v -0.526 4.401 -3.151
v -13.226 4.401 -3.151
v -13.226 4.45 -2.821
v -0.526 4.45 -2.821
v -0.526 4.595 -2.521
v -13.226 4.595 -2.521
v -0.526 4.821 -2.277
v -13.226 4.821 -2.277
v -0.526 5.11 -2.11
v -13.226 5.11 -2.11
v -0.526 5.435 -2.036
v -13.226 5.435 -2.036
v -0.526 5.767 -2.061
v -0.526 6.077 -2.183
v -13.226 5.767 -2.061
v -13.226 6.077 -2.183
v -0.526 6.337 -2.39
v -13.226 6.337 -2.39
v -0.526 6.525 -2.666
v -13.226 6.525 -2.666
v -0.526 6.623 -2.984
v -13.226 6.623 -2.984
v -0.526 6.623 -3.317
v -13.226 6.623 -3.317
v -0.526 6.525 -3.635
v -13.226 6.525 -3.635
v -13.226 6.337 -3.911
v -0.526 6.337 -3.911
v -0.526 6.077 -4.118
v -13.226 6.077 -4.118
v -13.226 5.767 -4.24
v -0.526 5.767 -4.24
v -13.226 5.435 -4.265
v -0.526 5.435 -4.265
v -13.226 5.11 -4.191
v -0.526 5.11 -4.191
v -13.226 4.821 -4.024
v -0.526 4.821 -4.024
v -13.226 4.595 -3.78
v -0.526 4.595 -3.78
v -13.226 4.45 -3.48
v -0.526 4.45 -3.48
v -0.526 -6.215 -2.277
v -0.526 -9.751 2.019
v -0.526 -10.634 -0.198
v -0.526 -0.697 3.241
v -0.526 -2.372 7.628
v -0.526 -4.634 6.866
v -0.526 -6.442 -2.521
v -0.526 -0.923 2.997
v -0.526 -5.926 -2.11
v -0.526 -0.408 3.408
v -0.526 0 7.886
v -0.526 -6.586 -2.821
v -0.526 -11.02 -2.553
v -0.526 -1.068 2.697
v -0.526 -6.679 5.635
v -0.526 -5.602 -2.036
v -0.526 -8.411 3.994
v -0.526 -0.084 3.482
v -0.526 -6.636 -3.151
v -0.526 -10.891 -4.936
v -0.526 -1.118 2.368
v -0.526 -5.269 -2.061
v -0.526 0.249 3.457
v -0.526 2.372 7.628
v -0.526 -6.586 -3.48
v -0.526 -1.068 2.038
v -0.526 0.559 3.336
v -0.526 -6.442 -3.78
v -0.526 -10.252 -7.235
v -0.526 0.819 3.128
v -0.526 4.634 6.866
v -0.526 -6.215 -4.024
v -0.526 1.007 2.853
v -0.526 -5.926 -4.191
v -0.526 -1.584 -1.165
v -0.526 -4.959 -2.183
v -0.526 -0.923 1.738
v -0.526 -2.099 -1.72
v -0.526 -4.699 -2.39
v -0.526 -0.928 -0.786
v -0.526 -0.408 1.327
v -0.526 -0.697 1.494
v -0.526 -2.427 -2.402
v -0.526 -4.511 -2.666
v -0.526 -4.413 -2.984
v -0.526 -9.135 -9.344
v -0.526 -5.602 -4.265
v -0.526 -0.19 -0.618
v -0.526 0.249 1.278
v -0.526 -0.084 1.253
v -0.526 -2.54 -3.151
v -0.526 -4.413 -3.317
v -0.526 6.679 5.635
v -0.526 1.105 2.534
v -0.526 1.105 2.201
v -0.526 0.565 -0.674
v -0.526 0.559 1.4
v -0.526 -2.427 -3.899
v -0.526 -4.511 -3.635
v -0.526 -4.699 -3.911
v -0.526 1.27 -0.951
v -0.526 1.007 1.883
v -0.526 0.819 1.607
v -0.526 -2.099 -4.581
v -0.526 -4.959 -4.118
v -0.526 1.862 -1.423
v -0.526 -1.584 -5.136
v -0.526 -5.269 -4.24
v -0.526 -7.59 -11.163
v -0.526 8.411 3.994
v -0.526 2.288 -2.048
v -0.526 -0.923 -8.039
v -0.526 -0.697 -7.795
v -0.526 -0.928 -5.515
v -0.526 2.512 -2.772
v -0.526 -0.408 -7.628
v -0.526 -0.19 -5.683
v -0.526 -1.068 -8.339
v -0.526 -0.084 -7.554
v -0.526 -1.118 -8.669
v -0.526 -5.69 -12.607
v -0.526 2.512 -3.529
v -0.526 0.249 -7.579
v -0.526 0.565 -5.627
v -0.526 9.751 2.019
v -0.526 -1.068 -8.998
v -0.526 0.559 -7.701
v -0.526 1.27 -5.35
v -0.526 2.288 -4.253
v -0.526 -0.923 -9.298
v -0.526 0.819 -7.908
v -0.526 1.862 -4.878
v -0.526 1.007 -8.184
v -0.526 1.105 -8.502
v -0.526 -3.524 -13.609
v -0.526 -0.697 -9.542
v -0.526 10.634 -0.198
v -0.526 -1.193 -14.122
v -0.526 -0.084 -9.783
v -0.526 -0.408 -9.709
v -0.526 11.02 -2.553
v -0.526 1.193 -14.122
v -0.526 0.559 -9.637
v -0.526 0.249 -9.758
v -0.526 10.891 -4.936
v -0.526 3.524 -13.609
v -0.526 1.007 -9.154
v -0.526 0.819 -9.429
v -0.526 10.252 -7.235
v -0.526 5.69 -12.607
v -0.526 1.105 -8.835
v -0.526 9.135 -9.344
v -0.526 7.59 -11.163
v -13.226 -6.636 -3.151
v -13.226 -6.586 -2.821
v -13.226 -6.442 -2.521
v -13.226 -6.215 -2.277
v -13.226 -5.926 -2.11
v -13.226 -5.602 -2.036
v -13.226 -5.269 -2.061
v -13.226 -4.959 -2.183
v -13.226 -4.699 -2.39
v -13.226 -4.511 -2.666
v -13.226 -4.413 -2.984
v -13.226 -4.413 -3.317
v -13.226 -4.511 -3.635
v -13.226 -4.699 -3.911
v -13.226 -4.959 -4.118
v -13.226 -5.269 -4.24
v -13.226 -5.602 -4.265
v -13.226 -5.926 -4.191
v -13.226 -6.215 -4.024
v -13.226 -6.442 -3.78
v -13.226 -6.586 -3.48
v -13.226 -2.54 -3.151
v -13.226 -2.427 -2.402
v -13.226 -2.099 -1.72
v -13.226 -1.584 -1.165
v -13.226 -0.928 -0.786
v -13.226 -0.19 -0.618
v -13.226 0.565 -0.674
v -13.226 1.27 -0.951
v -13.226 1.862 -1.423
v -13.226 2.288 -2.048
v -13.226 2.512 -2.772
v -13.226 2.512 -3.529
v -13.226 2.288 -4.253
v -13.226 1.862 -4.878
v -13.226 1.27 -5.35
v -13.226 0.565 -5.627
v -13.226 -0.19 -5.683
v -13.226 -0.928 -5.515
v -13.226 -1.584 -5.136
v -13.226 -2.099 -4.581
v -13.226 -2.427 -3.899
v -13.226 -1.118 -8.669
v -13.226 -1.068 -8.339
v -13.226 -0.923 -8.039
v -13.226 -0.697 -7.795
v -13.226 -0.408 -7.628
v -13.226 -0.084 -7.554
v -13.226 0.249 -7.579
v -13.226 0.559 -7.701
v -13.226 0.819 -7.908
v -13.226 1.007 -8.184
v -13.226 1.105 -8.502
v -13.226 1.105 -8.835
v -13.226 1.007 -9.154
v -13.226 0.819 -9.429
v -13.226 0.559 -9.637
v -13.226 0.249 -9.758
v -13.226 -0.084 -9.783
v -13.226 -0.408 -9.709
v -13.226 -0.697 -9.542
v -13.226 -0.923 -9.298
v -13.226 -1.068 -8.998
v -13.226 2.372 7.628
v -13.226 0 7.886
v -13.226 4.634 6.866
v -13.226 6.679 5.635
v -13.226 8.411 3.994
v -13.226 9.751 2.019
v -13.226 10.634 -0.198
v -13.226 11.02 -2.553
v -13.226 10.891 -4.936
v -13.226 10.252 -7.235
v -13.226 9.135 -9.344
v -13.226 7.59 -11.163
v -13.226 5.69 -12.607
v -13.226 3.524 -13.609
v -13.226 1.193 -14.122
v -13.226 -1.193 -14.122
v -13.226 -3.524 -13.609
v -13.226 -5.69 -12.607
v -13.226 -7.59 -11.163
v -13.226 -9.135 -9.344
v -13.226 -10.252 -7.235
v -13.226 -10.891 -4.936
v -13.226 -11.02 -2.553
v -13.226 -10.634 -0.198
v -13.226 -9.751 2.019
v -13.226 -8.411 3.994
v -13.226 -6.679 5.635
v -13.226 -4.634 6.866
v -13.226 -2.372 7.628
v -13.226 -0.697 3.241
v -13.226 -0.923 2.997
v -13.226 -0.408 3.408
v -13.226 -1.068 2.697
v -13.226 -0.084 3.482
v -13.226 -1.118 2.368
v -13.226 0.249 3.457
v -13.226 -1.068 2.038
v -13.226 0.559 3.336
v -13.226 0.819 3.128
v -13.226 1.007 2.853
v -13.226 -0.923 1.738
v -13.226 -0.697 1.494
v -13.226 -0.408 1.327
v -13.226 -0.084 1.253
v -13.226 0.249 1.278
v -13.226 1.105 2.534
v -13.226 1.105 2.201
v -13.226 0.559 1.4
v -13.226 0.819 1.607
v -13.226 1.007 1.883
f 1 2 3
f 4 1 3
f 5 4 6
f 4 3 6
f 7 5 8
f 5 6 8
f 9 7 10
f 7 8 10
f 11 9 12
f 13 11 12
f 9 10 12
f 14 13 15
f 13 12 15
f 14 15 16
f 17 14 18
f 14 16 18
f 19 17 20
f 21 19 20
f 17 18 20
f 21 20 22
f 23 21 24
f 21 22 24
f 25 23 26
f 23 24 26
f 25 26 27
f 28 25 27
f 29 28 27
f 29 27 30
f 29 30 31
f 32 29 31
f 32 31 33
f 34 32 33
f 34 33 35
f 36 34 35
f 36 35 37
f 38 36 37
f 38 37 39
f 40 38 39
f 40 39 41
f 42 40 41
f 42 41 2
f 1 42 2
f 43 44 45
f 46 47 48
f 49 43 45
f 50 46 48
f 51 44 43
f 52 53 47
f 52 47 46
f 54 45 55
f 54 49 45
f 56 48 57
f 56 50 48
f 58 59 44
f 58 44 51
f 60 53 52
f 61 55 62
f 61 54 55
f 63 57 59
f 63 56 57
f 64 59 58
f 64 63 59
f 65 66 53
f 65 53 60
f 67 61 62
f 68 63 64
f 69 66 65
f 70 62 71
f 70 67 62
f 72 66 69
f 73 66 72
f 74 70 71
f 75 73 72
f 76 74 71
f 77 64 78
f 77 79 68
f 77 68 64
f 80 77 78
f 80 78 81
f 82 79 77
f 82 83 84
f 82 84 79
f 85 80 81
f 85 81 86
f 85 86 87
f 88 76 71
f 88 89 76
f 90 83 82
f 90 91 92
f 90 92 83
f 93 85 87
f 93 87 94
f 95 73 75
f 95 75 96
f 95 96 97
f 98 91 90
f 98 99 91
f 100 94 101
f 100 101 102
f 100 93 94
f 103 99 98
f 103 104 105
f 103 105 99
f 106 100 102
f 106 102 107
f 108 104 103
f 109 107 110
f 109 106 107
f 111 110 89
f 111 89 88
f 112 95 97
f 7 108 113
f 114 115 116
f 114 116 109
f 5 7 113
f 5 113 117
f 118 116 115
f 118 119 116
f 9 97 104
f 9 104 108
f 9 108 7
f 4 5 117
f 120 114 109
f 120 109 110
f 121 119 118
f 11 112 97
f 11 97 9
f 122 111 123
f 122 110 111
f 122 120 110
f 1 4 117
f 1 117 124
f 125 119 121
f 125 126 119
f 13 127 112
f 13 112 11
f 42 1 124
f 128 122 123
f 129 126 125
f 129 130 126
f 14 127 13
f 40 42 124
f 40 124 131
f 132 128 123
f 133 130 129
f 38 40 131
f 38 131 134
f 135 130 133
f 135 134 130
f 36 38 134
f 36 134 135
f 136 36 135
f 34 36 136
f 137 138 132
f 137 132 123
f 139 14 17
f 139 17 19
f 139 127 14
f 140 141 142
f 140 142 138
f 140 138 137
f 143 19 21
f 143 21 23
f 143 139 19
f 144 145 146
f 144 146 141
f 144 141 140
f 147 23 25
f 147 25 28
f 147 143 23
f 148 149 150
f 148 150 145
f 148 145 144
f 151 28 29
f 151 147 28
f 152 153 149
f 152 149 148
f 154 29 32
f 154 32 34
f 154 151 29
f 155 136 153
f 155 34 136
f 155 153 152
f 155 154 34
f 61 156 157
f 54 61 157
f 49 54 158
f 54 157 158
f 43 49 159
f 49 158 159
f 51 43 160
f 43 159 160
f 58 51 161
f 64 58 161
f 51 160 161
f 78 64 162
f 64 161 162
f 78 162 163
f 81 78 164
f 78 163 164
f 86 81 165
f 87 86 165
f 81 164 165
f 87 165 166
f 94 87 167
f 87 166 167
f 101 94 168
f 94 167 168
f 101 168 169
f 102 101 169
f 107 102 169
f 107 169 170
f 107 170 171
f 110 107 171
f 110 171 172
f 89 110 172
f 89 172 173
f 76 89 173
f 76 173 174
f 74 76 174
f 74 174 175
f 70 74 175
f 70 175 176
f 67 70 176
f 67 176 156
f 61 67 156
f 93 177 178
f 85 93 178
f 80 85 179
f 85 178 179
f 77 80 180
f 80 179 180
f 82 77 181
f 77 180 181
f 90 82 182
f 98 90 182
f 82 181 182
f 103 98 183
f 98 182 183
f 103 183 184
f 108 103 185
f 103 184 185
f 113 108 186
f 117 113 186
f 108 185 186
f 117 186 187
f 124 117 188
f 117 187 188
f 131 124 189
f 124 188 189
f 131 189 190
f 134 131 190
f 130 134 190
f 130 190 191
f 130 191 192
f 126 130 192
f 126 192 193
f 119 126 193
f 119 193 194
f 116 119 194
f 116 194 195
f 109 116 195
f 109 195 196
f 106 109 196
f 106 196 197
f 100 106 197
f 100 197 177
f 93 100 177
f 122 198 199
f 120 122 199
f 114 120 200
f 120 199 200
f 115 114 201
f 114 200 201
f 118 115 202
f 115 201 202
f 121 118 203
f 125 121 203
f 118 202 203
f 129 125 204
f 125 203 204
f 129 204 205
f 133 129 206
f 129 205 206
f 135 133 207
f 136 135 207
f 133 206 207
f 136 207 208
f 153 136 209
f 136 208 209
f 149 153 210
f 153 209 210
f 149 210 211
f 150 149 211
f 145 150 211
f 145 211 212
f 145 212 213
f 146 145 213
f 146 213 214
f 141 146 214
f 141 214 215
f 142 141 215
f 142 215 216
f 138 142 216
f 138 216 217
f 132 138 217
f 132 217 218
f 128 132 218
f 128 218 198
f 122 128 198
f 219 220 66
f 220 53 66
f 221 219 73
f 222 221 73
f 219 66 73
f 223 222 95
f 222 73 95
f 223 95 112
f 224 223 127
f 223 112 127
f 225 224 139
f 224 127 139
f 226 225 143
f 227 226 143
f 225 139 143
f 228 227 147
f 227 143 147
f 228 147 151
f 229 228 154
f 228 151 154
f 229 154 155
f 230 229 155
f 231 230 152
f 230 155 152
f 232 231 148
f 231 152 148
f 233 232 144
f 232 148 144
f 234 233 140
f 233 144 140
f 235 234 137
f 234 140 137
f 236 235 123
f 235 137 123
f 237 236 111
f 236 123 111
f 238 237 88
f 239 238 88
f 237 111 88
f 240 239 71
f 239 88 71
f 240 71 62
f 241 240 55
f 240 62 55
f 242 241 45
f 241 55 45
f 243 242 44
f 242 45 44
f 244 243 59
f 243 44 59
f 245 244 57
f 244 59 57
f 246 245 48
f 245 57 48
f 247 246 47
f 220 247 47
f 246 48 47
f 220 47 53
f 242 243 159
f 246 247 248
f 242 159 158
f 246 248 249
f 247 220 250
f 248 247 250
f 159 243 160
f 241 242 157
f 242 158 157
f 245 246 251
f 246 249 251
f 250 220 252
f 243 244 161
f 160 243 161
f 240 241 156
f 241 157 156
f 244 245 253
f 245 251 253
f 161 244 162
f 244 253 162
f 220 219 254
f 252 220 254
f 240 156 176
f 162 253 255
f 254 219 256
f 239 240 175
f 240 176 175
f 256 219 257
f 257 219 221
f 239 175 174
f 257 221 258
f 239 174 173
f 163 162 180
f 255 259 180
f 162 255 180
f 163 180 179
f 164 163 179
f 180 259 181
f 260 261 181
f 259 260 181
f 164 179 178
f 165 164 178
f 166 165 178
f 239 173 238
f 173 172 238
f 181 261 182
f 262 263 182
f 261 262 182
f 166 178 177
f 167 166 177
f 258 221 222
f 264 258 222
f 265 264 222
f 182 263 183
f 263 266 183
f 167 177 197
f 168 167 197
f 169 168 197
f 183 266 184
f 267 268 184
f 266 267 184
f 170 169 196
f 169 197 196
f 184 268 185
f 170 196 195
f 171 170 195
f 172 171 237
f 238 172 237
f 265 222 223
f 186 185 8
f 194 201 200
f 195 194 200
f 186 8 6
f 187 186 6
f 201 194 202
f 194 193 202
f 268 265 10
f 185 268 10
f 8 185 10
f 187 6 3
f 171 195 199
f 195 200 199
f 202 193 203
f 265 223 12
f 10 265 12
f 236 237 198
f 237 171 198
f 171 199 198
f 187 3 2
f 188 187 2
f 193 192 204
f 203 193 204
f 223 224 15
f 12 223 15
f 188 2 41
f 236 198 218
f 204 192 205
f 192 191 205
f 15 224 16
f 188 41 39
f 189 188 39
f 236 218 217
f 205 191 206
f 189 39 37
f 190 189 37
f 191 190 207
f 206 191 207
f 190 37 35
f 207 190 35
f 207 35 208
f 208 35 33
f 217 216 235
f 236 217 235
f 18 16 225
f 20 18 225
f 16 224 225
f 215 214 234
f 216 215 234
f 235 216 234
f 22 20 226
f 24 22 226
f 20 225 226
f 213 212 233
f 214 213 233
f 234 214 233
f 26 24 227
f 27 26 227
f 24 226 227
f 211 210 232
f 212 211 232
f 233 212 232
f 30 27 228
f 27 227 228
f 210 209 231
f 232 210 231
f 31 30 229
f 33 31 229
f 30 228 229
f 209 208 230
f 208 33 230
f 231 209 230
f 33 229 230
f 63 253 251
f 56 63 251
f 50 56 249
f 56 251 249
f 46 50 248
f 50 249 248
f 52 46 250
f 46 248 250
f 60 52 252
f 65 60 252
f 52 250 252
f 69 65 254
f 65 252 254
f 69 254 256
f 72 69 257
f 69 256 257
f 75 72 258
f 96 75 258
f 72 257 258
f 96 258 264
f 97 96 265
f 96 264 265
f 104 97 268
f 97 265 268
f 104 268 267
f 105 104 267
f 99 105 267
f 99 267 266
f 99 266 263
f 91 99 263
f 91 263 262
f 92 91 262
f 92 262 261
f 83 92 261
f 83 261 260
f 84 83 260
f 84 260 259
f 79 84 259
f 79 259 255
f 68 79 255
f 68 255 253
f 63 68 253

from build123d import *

# Parameters (mm, degrees)
F0_W     = 12.7
F0_H     = 11.0363
F2_R     = 2.54
F2_R_2   = 1.1176
F3_DEPTH = 30.43168


with BuildPart() as f1:
    # F0 (on Front) → F1 (revolve)
    with BuildSketch(Plane.XZ):
        with Locations((-6.876068, 2.367642)):
            Rectangle(F0_W, F0_H)
    revolve(axis=Axis((-6.876068, 0, -3.150508), (-1, 0, 0)))

    # F2 (on face) → F3 (cut)
    with BuildSketch(Plane(origin=(-13.226068, 0, 0), x_dir=(0, -1, 0), z_dir=(-1, 0, 0))):
        with Locations((0, -3.150508)):
            Circle(F2_R)
        with Locations((-5.51815, -3.150508)):
            Circle(F2_R_2)
        with Locations((0, 2.367642)):
            Circle(F2_R_2)
        with Locations((5.51815, -3.150508)):
            Circle(F2_R_2)
        with Locations((0, -8.668658)):
            Circle(F2_R_2)
    extrude(amount=-F3_DEPTH, mode=Mode.SUBTRACT)


solid = f1.part
